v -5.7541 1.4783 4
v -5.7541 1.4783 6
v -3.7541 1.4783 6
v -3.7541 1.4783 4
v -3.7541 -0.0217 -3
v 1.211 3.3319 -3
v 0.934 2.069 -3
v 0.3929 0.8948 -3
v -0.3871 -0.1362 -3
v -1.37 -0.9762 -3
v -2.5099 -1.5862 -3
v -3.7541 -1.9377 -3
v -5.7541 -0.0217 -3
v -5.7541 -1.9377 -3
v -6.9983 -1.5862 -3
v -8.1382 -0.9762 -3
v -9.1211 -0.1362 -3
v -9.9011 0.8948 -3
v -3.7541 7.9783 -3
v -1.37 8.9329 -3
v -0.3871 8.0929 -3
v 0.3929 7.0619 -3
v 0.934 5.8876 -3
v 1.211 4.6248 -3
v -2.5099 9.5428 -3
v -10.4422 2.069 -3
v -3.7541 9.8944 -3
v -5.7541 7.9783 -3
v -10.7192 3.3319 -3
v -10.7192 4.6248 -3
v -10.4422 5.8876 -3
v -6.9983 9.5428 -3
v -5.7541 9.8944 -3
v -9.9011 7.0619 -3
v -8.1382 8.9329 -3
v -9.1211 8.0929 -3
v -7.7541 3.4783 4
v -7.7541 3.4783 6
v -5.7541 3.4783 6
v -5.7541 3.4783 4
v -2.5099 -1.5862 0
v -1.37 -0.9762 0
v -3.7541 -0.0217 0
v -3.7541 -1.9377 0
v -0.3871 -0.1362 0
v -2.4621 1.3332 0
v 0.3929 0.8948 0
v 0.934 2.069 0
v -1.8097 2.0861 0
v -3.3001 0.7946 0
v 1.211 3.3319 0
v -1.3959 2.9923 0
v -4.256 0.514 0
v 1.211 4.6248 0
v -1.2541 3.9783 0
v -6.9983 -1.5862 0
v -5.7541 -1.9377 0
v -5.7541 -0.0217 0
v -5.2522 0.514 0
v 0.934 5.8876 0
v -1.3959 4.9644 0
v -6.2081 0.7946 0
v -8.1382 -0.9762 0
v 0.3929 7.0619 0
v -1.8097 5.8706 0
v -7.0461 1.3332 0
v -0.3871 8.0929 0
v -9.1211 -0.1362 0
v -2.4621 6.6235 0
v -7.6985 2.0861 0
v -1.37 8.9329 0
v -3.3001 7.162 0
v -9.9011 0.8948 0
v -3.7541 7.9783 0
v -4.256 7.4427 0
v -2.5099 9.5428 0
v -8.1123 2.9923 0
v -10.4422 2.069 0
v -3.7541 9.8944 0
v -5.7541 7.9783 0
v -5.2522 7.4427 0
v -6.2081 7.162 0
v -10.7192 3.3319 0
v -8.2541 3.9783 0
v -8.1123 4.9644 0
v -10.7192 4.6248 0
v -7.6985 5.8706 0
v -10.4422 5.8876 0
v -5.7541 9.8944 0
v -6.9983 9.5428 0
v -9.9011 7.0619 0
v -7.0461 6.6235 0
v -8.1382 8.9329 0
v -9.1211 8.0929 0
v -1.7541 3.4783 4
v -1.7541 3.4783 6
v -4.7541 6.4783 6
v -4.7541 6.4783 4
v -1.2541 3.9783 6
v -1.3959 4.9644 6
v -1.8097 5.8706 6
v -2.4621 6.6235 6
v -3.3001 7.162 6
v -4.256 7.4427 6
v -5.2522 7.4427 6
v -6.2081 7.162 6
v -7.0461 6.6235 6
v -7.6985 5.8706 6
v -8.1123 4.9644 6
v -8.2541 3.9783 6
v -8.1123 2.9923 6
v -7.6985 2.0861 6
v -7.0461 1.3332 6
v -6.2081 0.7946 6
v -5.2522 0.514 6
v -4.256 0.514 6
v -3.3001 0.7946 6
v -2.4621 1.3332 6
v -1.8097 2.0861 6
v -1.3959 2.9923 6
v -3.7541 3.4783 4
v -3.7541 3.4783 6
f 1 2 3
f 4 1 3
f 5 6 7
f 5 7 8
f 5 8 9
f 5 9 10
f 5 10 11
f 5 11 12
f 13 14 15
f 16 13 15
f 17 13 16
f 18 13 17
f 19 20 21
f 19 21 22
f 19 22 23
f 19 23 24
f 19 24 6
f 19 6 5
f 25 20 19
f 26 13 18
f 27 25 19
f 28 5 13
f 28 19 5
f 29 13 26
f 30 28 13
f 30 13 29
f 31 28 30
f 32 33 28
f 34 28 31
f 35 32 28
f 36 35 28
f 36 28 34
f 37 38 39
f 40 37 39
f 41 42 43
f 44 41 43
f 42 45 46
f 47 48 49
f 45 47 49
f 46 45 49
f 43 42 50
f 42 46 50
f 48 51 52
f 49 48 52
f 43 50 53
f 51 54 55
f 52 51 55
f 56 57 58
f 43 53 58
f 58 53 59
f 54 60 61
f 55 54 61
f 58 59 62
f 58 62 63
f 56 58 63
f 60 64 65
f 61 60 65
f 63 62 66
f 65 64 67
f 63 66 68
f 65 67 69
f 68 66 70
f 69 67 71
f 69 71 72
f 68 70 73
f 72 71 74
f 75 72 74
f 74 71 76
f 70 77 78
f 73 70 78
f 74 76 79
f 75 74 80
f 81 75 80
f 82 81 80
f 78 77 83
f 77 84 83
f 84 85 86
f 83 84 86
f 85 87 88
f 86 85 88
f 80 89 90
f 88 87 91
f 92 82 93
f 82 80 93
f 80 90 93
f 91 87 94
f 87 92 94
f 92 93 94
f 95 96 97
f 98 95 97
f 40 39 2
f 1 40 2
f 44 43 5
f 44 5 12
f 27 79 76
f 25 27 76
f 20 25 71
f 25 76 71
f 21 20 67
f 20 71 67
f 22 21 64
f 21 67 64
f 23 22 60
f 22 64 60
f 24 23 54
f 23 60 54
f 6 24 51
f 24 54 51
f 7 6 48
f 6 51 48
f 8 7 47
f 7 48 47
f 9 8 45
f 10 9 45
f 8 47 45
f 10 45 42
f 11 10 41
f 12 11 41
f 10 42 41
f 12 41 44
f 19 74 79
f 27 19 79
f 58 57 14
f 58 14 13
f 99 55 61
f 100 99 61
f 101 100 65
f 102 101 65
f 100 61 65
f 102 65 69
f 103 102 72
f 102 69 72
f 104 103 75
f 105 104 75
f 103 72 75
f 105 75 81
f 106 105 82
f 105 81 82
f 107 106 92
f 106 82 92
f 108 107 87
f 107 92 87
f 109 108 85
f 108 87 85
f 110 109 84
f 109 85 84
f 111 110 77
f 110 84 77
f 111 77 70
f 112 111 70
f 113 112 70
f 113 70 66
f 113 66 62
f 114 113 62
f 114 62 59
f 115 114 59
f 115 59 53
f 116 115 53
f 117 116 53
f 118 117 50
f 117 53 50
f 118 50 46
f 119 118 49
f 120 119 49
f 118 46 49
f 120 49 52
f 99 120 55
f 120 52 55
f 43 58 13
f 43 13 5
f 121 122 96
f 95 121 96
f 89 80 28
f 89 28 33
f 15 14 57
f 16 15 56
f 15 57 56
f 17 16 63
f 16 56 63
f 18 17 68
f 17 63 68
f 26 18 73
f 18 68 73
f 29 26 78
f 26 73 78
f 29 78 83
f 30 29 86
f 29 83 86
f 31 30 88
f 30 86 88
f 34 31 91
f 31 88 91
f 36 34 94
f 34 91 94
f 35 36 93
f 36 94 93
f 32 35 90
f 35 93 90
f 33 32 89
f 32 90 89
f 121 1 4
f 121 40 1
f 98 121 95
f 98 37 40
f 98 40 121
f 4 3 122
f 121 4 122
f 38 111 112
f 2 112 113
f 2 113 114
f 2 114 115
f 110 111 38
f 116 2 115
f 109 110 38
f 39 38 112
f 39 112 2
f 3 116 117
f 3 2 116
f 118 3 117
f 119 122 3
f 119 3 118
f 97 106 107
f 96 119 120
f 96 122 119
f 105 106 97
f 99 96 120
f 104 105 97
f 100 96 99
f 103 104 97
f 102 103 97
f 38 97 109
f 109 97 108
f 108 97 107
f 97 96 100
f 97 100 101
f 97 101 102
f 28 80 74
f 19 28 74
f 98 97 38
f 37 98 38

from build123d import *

# Parameters (mm, degrees)
CROQUIS1_R              = 3.5
SALIENTE_EXTRUIR1_DEPTH = 6
CROQUIS2_R              = 6
SALIENTE_EXTRUIR2_DEPTH = 3
CORTAR_EXTRUIR1_DEPTH   = 2
CROQUIS4_W              = 2
CROQUIS4_H              = 2
CORTAR_EXTRUIR2_DEPTH   = 4


with BuildPart() as part:
    # Croquis1 → Saliente-Extruir1 (new body)
    with BuildSketch(Plane.XY):
        with Locations((-4.754102012, 3.97833761)):
            Circle(CROQUIS1_R)
    extrude(amount=SALIENTE_EXTRUIR1_DEPTH)

    # Croquis2 → Saliente-Extruir2 (add)
    with BuildSketch(Plane(origin=(0, 0, 0), x_dir=(-1, 0, 0), z_dir=(0, 0, -1))):
        with Locations((4.754102012, 3.97833761)):
            Circle(CROQUIS2_R)
    extrude(amount=SALIENTE_EXTRUIR2_DEPTH)

    # Croquis3 → Cortar-Extruir1 (cut)
    with BuildSketch(Plane.XY.offset(6)):
        Polygon((-5.754102012, 1.47833761), (-3.754102012, 1.47833761), (-3.754102012, 3.47833761), (-1.754102012, 3.47833761), (-4.754102012, 6.47833761), (-7.754102012, 3.47833761), (-5.754102012, 3.47833761), align=None)
    extrude(amount=-CORTAR_EXTRUIR1_DEPTH, mode=Mode.SUBTRACT)

    # Croquis4 → Cortar-Extruir2 (cut, through all)
    with BuildSketch(Plane.XY):
        with Locations((-4.754102012, 8.97833761)):
            Rectangle(CROQUIS4_W, CROQUIS4_H)
        Polygon((-5.754102012, -0.02166239), (-3.754102012, -0.02166239), (-3.754102012, -2.02166239), (-4.754102012, -2.02166239), (-5.754102012, -2.02166239), align=None)
    extrude(amount=-CORTAR_EXTRUIR2_DEPTH, mode=Mode.SUBTRACT)


solid = part.part
